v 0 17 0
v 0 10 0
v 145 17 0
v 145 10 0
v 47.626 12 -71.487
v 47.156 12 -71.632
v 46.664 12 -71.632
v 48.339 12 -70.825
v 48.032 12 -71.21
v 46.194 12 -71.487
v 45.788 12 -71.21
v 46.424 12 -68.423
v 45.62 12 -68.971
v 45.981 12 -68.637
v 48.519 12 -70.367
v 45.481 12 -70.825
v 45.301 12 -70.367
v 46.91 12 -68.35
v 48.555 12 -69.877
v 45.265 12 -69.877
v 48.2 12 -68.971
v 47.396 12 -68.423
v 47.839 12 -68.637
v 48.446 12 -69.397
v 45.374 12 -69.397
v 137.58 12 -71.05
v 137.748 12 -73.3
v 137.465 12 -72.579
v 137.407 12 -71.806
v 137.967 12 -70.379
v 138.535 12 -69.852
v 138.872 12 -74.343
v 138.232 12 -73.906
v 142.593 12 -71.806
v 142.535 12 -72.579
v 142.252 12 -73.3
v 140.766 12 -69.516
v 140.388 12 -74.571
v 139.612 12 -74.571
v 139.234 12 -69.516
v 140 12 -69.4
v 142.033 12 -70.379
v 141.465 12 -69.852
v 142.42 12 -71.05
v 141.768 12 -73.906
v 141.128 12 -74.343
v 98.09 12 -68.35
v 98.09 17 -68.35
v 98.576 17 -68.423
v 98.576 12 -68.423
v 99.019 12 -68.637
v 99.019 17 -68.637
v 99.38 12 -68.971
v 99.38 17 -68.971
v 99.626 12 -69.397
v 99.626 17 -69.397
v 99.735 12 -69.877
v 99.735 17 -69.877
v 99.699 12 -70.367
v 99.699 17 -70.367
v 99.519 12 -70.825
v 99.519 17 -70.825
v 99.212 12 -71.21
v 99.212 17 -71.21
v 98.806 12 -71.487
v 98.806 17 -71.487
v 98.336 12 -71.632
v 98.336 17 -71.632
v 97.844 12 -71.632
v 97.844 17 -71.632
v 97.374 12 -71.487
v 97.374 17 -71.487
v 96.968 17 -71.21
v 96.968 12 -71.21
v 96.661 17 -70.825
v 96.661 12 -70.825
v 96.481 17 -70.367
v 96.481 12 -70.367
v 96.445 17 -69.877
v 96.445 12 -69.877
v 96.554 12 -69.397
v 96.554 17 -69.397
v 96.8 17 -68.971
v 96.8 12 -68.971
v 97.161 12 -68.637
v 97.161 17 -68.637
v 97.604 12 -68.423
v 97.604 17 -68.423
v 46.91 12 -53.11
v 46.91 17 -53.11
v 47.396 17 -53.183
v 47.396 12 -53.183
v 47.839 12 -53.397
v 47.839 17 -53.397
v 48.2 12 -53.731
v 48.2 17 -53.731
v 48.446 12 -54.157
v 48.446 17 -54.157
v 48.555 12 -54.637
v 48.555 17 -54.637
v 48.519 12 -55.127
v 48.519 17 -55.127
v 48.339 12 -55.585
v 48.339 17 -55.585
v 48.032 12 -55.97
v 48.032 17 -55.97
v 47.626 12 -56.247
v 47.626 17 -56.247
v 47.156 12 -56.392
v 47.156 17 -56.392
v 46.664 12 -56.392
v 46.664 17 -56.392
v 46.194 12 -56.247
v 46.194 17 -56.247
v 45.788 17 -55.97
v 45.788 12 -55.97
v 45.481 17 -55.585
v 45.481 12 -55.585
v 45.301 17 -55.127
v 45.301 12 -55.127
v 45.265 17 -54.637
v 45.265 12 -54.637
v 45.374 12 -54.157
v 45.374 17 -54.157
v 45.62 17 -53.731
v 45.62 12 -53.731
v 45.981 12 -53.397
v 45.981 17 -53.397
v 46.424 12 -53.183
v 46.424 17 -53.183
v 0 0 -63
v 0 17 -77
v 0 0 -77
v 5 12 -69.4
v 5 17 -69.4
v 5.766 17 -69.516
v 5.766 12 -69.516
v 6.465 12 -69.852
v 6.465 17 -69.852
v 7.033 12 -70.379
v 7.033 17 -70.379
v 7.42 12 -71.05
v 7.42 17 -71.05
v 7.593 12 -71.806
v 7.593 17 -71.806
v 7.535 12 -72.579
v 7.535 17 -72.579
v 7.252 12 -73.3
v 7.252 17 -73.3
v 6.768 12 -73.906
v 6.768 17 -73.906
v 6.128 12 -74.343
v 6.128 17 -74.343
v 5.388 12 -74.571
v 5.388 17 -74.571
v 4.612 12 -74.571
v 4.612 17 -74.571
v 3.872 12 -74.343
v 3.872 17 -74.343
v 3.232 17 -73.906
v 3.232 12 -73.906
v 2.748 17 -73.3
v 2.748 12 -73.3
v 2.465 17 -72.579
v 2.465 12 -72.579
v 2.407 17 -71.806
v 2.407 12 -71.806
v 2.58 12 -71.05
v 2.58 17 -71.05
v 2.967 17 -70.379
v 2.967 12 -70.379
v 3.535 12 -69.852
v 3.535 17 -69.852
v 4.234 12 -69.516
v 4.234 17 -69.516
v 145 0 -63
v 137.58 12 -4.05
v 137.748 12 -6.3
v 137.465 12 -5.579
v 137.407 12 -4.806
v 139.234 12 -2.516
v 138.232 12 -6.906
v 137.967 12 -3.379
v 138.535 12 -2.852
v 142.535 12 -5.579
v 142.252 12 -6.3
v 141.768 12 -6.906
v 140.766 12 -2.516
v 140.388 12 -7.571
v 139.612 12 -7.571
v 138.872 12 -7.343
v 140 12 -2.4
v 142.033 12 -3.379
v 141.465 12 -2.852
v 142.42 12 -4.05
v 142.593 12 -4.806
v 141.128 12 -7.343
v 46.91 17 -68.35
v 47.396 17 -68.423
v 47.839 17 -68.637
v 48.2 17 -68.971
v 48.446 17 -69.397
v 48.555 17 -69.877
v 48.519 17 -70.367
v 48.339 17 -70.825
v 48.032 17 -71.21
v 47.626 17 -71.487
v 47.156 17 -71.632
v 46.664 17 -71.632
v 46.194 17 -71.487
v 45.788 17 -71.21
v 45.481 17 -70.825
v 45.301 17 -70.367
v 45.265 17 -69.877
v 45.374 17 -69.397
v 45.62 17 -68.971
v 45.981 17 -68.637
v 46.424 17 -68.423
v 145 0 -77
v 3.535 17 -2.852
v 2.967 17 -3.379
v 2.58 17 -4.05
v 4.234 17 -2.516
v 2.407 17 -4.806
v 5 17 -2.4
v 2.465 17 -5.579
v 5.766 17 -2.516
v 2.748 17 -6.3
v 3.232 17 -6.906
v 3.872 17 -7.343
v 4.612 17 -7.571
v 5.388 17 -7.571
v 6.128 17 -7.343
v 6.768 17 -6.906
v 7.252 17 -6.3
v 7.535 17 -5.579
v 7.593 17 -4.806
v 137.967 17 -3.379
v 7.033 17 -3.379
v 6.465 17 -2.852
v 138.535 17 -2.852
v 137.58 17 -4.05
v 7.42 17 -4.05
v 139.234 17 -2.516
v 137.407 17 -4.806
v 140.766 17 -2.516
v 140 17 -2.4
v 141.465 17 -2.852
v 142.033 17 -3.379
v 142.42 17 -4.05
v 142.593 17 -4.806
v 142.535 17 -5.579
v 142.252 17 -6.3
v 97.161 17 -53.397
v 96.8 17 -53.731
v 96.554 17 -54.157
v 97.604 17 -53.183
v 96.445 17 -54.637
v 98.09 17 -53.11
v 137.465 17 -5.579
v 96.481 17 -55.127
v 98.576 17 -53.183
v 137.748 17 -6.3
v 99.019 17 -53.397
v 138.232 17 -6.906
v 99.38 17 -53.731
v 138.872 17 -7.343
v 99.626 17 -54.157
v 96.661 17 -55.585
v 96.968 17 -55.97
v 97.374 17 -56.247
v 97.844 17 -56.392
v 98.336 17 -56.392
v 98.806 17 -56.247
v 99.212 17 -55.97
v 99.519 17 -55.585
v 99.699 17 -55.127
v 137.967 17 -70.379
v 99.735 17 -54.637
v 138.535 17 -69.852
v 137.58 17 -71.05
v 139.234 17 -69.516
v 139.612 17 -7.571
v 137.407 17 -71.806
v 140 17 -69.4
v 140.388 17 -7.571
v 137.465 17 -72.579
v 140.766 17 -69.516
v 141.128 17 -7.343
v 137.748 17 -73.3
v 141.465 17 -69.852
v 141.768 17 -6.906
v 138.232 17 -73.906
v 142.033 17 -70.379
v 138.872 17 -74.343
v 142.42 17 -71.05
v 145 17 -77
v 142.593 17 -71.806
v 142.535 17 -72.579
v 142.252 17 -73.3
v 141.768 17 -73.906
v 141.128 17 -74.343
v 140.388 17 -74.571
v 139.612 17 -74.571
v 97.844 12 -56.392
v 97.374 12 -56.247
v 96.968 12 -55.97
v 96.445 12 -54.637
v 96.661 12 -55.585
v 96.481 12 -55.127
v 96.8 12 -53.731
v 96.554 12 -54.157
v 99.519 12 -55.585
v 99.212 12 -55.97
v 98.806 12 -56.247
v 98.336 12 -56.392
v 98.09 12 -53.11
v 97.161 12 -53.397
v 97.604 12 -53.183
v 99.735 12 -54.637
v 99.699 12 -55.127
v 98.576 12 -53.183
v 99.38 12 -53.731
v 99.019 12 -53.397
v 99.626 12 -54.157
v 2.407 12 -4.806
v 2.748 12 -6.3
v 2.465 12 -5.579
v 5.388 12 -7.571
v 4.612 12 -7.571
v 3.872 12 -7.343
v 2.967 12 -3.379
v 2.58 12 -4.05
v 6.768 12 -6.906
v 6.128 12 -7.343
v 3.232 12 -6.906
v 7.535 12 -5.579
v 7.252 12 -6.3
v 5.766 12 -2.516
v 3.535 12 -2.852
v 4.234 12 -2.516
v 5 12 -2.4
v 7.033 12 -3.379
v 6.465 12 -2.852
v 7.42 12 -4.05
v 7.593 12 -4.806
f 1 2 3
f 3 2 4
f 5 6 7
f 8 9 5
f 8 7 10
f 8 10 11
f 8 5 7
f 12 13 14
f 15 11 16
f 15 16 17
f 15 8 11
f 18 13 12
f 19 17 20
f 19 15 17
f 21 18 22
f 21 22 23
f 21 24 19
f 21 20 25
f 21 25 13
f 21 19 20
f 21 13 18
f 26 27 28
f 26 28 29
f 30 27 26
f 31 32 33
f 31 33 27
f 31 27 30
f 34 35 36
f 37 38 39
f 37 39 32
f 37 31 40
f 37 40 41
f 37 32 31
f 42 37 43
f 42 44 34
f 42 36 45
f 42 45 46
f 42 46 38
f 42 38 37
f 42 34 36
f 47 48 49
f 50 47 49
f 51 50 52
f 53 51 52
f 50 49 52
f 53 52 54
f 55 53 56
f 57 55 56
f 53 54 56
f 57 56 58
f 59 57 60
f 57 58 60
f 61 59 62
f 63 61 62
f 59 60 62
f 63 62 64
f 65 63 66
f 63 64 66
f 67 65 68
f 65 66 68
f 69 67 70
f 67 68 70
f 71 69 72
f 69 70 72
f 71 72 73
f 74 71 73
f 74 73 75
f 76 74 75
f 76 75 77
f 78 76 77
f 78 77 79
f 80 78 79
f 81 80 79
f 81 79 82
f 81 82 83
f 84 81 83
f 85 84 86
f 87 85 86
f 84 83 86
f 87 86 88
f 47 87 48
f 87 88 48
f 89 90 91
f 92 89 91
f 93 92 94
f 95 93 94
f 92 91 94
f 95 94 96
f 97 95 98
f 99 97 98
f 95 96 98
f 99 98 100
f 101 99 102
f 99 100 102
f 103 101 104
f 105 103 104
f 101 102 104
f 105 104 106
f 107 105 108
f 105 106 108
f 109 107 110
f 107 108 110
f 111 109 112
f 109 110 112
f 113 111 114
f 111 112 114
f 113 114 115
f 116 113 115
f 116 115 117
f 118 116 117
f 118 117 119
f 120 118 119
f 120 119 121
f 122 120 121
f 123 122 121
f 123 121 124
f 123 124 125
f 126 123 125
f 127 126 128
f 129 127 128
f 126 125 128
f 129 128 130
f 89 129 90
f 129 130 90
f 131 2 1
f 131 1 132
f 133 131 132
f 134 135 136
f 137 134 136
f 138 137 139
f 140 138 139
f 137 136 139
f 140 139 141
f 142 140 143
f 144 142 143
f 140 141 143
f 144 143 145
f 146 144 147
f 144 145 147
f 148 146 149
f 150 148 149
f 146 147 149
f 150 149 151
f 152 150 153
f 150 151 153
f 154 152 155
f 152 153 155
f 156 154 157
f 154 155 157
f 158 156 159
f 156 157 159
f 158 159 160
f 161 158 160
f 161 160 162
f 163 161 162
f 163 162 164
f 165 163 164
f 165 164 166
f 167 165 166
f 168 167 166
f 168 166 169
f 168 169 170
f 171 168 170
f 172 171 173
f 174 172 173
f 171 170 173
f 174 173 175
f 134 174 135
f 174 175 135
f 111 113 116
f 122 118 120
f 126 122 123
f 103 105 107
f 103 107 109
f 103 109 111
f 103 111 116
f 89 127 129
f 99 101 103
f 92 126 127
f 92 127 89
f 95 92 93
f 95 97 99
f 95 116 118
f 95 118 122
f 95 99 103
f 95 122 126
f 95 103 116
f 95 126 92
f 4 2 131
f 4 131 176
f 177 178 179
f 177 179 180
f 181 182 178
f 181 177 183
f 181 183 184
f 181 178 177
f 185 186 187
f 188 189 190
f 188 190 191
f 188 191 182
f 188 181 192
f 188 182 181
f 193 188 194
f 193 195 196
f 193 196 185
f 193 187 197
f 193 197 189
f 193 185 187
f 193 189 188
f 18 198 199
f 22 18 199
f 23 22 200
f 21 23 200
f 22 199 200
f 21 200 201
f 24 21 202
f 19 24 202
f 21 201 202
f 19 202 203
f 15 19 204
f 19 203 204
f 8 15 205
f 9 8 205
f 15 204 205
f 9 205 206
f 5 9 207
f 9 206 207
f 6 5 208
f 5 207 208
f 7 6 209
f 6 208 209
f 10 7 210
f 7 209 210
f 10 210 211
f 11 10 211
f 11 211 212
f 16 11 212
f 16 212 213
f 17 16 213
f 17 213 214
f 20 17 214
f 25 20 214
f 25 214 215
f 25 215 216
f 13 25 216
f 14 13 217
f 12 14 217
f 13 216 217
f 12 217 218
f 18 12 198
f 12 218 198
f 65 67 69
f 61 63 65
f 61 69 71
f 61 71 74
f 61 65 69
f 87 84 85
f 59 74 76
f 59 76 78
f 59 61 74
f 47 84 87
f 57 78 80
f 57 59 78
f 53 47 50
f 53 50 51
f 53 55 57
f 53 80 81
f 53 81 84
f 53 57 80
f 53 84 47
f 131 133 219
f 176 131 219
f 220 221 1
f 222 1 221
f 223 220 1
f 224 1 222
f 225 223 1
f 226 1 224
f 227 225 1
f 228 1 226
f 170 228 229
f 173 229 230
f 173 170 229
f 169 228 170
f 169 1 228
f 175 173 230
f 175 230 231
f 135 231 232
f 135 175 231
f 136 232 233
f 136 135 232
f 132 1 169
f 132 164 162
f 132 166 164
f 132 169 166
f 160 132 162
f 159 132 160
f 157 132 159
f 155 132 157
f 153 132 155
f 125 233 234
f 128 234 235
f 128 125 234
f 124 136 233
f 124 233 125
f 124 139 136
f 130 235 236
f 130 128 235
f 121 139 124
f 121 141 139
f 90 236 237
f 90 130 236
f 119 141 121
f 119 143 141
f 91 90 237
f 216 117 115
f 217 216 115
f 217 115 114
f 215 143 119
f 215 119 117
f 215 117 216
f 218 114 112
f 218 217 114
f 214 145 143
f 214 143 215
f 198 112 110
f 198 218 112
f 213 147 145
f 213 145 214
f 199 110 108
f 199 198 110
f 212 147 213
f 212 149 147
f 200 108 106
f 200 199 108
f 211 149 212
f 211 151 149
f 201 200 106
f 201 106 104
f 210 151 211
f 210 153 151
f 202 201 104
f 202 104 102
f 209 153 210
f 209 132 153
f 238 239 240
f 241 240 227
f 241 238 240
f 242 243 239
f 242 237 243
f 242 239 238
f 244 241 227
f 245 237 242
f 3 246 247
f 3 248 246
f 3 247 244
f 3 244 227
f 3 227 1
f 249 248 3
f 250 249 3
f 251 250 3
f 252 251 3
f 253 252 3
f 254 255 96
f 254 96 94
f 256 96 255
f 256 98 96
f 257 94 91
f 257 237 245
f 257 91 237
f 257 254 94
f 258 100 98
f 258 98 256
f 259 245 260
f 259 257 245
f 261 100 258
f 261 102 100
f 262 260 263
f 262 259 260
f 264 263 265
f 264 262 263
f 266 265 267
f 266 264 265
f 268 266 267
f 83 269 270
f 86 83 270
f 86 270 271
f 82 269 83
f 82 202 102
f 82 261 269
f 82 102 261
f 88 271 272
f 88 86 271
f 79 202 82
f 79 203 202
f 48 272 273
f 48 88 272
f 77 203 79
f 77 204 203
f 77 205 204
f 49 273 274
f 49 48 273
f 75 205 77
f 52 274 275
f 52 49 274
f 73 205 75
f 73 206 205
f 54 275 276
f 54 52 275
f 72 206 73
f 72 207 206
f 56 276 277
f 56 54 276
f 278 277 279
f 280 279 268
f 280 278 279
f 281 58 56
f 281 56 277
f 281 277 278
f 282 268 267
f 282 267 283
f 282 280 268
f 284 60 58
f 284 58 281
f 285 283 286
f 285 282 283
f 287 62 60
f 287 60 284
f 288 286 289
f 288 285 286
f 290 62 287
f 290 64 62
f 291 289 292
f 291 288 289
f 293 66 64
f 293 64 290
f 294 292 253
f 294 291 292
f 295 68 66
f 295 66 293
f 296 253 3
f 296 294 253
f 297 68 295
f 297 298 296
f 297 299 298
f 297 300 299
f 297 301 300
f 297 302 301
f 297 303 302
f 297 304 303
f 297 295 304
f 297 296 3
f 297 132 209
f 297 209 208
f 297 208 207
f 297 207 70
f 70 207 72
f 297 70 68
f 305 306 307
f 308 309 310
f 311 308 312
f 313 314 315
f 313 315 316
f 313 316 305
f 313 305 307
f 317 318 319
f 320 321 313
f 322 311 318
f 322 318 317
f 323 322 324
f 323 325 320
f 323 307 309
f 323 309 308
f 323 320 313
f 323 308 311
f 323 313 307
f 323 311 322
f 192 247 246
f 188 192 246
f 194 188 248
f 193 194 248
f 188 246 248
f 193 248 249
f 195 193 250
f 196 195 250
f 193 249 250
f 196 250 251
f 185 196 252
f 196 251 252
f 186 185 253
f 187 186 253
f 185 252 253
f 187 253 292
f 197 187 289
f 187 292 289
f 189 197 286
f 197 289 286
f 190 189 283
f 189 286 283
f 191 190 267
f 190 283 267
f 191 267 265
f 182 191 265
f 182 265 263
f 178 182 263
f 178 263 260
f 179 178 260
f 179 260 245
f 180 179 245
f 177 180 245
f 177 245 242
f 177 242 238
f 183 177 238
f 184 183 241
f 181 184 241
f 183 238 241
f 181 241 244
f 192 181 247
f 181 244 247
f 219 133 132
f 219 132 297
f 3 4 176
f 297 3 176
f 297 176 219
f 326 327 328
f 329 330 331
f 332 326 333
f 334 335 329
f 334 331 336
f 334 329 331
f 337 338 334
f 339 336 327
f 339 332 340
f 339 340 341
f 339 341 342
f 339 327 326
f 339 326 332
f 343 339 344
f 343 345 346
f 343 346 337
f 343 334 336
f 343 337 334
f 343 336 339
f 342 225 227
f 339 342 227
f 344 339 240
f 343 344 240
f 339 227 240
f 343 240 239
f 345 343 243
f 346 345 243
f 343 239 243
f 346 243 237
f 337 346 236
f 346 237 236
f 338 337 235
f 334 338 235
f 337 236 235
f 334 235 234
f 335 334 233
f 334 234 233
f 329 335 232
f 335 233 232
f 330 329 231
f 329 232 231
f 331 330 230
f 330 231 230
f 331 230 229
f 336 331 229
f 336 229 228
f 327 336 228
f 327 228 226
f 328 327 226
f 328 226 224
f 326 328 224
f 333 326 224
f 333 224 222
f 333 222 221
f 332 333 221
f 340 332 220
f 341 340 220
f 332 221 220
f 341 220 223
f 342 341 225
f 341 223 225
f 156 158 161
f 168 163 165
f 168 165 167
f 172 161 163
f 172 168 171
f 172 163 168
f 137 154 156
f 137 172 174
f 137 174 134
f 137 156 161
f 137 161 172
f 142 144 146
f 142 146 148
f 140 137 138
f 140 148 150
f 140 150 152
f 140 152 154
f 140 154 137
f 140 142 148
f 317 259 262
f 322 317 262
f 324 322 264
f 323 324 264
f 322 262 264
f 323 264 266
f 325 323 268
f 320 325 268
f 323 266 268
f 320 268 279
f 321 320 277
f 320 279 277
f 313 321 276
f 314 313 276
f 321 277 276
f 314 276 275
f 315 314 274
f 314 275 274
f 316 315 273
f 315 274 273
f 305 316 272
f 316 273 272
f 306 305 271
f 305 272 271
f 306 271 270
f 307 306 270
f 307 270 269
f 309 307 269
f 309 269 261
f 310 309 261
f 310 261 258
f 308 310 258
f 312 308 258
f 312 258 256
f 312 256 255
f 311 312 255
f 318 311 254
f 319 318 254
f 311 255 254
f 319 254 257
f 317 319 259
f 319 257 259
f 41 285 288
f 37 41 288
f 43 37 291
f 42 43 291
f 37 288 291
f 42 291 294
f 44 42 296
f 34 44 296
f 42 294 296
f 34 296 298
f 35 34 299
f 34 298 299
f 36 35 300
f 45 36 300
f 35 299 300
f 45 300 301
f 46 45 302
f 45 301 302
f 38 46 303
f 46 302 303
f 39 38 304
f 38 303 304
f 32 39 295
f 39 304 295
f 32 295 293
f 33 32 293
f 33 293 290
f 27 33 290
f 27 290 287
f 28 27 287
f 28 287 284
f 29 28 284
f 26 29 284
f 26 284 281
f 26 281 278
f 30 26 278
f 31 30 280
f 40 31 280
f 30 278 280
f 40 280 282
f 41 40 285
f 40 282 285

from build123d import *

# Parameters (mm, degrees)
SKETCH5_W           = 145
SKETCH5_H           = 77
BOSS_EXTRUDE2_DEPTH = 17
CHAMFER2_SIZE       = 63
CHAMFER2_SIZE2      = 10
SKETCH1_R           = 2.6
SKETCH1_R_2         = 1.65
CUT_EXTRUDE1_DEPTH  = 5


with BuildPart() as part:
    # Sketch5 → Boss-Extrude2 (new body)
    with BuildSketch(Plane(origin=(0, 0, 0), x_dir=(1, 0, 0), z_dir=(0, 1, 0))):
        with Locations((72.5, 38.5)):
            Rectangle(SKETCH5_W, SKETCH5_H)
    extrude(amount=BOSS_EXTRUDE2_DEPTH)

    # Chamfer2
    chamfer2_edges = [part.edges().sort_by_distance(p)[0] for p in [
        (72.5, 0, 0),
    ]]
    chamfer2_side = [part.faces().sort_by_distance(p)[0] for p in [
        (72.5, 0, -38.5),
    ]]
    chamfer(chamfer2_edges, length=CHAMFER2_SIZE, length2=CHAMFER2_SIZE2, reference=chamfer2_side[0])

    # Sketch1 → Cut-Extrude1 (cut)
    with BuildSketch(Plane(origin=(0, 17, 0), x_dir=(1, 0, 0), z_dir=(0, 1, 0))):
        with Locations(Location((5, 72, 0), (0, 0, 270))):
            Circle(SKETCH1_R)
        with Locations(Location((5, 5, 0), (0, 0, 270))):
            Circle(SKETCH1_R)
        with Locations(Location((140, 5, 0), (0, 0, 270))):
            Circle(SKETCH1_R)
        with Locations(Location((140, 72, 0), (0, 0, 270))):
            Circle(SKETCH1_R)
        with Locations(Location((46.91, 70, 0), (0, 0, 270))):
            Circle(SKETCH1_R_2)
        with Locations(Location((46.91, 54.76, 0), (0, 0, 270))):
            Circle(SKETCH1_R_2)
        with Locations(Location((98.09, 70, 0), (0, 0, 270))):
            Circle(SKETCH1_R_2)
        with Locations(Location((98.09, 54.76, 0), (0, 0, 270))):
            Circle(SKETCH1_R_2)
    extrude(amount=-CUT_EXTRUDE1_DEPTH, mode=Mode.SUBTRACT)


solid = part.part
